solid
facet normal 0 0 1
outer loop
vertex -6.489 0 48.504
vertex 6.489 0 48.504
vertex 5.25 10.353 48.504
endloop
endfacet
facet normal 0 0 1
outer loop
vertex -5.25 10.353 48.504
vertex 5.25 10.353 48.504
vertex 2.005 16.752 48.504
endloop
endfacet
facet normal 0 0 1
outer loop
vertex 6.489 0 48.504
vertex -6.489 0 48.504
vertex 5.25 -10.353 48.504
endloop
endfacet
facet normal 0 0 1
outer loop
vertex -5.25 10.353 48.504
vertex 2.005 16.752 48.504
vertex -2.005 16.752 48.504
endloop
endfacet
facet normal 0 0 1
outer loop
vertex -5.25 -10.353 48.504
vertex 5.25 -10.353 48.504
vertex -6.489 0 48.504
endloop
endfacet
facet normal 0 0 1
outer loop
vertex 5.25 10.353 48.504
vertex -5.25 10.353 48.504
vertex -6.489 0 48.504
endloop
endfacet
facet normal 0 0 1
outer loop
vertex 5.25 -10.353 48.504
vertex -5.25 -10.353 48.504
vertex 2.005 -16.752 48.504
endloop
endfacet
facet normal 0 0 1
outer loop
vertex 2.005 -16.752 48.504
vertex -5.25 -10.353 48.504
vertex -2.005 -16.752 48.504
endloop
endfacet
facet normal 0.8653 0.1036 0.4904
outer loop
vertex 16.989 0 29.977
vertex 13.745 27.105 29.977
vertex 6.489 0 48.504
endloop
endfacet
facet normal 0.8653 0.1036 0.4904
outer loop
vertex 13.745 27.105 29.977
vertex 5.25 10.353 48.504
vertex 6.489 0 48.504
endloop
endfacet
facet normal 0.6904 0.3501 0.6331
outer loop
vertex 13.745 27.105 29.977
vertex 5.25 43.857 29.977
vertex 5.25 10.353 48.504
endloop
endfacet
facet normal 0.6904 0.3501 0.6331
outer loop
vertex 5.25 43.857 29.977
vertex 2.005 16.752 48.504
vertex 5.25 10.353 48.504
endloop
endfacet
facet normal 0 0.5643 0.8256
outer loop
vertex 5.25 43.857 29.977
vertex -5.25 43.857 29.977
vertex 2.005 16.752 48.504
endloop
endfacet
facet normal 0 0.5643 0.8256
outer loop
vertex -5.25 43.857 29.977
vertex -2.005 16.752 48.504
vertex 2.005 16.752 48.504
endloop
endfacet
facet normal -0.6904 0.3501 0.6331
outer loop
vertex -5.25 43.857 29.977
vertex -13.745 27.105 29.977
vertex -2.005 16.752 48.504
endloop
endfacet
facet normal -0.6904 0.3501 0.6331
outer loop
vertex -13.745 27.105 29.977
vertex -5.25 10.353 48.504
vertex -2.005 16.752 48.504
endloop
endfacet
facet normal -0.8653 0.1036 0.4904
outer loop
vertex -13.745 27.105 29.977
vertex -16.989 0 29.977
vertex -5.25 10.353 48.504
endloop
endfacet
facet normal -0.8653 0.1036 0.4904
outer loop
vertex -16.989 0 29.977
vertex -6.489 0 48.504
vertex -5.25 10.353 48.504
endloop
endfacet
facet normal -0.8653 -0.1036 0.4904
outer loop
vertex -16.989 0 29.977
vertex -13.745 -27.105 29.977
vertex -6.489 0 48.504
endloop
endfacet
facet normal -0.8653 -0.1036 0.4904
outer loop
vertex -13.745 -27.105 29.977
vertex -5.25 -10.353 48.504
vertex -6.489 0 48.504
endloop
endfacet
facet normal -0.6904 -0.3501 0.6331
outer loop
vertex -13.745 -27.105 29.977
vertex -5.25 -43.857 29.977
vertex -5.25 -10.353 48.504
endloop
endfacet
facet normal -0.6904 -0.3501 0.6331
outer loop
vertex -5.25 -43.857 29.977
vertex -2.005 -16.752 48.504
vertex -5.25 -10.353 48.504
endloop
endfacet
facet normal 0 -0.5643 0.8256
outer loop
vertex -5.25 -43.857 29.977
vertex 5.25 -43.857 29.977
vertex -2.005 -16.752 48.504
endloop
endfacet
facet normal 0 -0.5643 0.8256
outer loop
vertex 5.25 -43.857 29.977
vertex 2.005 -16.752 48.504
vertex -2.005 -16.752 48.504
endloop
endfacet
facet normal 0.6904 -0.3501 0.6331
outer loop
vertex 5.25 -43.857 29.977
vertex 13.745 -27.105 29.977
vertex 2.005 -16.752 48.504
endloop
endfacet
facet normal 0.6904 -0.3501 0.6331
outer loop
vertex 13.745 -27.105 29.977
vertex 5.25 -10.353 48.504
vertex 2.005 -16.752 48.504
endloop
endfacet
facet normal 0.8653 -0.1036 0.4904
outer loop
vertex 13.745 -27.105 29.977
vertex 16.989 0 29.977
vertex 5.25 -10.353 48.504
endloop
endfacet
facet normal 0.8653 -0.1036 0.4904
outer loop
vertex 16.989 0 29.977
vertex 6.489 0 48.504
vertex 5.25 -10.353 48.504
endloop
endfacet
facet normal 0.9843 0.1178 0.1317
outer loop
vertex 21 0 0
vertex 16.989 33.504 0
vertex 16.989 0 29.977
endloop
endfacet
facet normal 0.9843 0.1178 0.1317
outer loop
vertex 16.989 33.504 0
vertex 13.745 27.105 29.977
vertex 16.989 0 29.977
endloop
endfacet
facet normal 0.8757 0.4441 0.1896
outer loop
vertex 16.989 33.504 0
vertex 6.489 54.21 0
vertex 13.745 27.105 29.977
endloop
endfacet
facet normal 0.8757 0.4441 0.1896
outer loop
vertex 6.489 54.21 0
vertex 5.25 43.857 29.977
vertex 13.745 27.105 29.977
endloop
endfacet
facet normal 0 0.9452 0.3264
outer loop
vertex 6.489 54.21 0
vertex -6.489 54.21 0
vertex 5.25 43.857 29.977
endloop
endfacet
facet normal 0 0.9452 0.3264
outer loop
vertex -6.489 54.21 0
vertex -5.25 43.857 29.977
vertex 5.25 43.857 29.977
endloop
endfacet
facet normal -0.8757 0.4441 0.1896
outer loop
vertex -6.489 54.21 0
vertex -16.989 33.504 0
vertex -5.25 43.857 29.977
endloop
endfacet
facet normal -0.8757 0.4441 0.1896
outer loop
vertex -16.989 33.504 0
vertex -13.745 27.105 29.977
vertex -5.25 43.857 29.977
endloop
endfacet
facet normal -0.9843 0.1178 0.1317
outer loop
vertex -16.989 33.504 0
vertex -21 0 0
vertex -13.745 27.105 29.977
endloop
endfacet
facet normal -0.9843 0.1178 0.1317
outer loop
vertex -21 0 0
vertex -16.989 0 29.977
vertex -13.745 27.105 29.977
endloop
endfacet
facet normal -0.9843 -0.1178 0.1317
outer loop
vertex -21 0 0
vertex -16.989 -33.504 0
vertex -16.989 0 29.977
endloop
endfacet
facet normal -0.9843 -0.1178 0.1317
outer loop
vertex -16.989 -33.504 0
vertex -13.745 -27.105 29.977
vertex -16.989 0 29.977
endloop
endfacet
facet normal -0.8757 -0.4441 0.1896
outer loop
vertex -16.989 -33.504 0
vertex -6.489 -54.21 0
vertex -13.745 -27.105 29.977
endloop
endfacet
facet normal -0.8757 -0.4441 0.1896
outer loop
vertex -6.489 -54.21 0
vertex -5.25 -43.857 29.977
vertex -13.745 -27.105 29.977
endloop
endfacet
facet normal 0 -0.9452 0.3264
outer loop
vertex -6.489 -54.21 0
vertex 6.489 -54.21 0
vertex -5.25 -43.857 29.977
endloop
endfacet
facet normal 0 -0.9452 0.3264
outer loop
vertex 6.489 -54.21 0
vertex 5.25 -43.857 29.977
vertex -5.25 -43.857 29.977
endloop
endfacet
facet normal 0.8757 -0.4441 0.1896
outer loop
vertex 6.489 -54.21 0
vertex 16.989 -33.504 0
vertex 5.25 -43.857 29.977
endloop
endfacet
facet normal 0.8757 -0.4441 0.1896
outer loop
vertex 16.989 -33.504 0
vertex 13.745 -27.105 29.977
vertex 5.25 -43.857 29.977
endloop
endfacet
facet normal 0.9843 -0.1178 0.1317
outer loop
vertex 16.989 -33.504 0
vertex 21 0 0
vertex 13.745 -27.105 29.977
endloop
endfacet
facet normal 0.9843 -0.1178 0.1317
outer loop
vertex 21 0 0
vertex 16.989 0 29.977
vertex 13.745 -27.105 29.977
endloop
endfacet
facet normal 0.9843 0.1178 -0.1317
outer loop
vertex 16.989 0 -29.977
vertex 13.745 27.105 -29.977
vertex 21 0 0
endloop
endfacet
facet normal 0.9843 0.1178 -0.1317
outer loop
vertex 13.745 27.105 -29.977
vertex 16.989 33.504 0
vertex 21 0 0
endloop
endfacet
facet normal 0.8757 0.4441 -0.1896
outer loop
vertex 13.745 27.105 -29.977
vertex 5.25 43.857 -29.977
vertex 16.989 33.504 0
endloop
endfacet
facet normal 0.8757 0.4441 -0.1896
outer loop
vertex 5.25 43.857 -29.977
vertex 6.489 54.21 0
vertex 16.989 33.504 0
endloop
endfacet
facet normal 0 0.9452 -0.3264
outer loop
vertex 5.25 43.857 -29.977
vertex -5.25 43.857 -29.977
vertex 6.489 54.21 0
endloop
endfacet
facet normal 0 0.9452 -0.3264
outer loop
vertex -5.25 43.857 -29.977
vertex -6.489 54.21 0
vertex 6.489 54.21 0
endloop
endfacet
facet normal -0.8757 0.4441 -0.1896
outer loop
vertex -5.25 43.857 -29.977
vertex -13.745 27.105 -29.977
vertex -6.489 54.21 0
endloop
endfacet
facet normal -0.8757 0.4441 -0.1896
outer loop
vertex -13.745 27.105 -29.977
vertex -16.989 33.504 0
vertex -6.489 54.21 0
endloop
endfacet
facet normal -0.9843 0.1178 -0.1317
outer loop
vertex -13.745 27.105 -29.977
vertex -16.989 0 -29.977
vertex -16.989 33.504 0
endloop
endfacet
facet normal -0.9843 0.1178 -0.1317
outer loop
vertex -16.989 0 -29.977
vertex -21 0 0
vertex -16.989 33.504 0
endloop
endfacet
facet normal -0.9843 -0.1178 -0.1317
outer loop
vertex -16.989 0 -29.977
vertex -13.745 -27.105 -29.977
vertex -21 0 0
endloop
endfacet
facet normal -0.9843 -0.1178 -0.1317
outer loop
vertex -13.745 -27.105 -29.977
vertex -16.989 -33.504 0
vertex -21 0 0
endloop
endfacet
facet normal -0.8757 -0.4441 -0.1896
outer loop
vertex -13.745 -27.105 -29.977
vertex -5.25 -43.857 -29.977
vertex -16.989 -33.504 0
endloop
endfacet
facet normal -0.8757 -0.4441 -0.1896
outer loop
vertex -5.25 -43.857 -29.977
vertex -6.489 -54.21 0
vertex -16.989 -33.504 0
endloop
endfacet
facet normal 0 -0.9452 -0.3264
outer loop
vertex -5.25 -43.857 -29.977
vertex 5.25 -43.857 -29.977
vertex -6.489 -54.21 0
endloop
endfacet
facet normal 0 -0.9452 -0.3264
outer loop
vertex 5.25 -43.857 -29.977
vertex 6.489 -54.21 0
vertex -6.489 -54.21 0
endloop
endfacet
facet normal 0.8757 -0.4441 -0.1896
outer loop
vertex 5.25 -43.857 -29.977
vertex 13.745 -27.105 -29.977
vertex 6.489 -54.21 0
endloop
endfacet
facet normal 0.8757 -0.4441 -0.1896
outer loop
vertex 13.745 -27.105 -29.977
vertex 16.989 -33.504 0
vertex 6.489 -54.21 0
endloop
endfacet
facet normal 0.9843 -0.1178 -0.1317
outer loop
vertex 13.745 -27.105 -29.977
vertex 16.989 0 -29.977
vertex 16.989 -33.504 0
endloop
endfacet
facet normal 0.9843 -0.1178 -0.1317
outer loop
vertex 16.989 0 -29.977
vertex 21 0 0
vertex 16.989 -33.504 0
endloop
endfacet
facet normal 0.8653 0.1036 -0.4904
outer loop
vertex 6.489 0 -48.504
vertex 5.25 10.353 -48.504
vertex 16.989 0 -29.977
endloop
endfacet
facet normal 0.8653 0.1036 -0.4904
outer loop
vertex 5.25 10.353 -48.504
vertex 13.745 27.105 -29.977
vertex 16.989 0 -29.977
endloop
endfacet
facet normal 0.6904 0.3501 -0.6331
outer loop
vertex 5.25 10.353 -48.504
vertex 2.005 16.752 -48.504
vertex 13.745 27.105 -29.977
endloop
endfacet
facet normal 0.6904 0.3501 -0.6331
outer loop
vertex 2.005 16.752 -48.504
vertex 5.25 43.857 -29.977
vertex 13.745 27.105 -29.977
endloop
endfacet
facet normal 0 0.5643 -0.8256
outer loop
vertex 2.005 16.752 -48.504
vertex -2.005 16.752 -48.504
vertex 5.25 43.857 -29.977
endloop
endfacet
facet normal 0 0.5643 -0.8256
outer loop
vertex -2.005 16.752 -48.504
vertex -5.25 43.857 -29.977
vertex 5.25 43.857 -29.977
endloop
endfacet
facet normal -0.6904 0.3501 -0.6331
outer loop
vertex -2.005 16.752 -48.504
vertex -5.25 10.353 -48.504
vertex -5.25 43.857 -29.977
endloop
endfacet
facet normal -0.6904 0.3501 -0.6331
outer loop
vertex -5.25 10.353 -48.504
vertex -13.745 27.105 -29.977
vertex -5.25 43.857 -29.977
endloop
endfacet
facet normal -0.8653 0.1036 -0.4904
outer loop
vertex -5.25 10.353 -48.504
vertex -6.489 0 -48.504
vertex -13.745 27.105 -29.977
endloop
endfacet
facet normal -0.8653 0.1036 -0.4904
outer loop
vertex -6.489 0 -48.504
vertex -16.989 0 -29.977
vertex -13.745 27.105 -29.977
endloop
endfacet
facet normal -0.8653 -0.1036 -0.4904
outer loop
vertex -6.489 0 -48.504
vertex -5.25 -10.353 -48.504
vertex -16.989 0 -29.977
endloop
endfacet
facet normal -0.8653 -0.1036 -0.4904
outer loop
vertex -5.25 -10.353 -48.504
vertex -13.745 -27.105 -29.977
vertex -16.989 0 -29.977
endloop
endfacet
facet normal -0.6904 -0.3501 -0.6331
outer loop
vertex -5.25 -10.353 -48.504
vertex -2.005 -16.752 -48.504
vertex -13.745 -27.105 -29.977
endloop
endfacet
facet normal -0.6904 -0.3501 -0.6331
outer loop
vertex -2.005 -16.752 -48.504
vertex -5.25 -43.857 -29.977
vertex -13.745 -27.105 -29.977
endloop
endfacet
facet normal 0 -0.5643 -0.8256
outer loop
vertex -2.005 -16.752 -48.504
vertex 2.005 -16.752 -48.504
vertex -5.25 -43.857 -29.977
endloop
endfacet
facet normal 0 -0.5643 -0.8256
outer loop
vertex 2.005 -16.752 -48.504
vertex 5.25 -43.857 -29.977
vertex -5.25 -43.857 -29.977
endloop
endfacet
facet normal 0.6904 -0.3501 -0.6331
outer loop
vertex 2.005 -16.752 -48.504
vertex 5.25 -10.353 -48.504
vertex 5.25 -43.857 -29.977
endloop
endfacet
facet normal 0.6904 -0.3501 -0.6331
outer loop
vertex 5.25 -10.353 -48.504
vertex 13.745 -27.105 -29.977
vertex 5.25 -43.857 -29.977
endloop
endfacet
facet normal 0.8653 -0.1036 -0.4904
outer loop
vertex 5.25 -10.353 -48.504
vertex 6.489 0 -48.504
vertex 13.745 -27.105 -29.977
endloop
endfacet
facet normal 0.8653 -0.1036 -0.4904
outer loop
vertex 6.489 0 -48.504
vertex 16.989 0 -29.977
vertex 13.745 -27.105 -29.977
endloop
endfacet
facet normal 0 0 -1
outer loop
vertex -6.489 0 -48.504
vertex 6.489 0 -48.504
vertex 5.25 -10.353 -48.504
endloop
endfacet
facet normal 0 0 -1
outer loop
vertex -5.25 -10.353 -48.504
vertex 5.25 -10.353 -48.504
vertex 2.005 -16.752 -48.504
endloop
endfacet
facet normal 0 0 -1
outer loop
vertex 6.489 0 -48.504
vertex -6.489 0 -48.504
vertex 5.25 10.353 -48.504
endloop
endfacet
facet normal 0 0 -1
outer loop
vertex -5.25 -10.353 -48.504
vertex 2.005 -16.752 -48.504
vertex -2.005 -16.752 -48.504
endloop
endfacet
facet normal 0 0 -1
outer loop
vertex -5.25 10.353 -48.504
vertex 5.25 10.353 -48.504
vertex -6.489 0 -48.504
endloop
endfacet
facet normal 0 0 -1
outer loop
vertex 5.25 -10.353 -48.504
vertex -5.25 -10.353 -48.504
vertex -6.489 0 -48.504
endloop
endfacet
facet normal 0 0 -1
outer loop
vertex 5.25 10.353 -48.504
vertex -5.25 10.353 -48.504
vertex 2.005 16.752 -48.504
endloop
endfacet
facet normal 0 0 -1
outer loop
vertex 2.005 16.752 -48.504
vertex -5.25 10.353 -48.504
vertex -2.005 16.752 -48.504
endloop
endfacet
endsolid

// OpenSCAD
// Generated by SolidPython 1.0.1 on 2020-07-29 00:46:48


scale(v = [7, 19, 17]) {
	sphere(r = 3);
}
/***********************************************
*********      SolidPython code:      **********
************************************************
 
# import packages: SolidPython
from solid import *
from solid.utils import *
from itertools import chain, combinations, permutations


class Resize:

    def __init__(self, scad_file):
        self.scad_file = scad_file
        #self.scad_file = import_scad(scad_file)
        # cone/cylinder param:
        self.r1 = 0
        self.r2 = 0
        self.h = 0
        # rectangular prism param:
        self.w = 0
        self.l = 0
        # ellipse param:
        self.r = 0

    # import OpenScad code (file name corresponds to shape)


    # classify shape + parameters
    def assign(self, param1, param2, param3):
        if self.scad_file == 'cone.scad':
            self.r1 = param1
            self.r2 = param2
            self.h = param3
        elif self.scad_file == 'cylinder.scad':
            self.r1 = param1
            self.r2 = param2
            self.h = param3
        elif self.scad_file == 'rectangularPrism.scad':
            self.h = param1
            self.l = param2
            self.w = param3
        else:
            self.r = param1
            self.h = param2

    # resize parameters
    def iterate(self):
        x = range(3, 20, 2)
        i = 1
        if self.scad_file == 'cone.scad':
            tempList = list(permutations(x, 2))
            for temp in tempList:
                param1 = temp[0]
                param2 = temp[1]
                filepath = 'produced_scad_files/' + 'cone' + str(param1) + '_' + str(param2) + '_' + '.scad'
                scad_render_to_file(cylinder(h=param1, r1=param2, r2=0), filepath)

        elif self.scad_file == 'cylinder.scad':
            tempList = list(permutations(x, 3))
            for temp in tempList:
                param1 = temp[0]
                param2 = temp[1]
                filepath = 'produced_scad_files/' + 'cylinder' + str(param1) + '_' + str(param2) + '_' + '.scad'
                scad_render_to_file(cylinder(h=param1, r1=param2, r2=param2), filepath)

        elif self.scad_file == 'rectangularPrism.scad':
            tempList = list(permutations(x, 3))
            for temp in tempList:
                param1 = temp[0]
                param2 = temp[1]
                param3 = temp[2]
                filepath = 'produced_scad_files/' + 'rectangularPrism' + str(param1) + '_' + str(param2) + '_' + str(
                    param3) + '.scad'
                scad_render_to_file(cube(size=(param1, param2, param3)), filepath)

        elif self.scad_file == 'ellipse.scad':
            tempList = list(permutations(x, 4))
            for temp in tempList:
                param1 = temp[0]
                param2 = temp[1]
                param3 = temp[2]
                param4 = temp[3]
                filepath = 'produced_scad_files/' + 'ellipse' + str(param1) + '_' + str(param2) + '_' + str(param3) + '_' + str(param4) + '.scad'
                scad_render_to_file(scale([param1, param2, param3])(sphere(r=param4)), filepath)

    def render_to_scadfile(self):
        scad_render_to_file(scad, 'example.scad') 
 
************************************************/
